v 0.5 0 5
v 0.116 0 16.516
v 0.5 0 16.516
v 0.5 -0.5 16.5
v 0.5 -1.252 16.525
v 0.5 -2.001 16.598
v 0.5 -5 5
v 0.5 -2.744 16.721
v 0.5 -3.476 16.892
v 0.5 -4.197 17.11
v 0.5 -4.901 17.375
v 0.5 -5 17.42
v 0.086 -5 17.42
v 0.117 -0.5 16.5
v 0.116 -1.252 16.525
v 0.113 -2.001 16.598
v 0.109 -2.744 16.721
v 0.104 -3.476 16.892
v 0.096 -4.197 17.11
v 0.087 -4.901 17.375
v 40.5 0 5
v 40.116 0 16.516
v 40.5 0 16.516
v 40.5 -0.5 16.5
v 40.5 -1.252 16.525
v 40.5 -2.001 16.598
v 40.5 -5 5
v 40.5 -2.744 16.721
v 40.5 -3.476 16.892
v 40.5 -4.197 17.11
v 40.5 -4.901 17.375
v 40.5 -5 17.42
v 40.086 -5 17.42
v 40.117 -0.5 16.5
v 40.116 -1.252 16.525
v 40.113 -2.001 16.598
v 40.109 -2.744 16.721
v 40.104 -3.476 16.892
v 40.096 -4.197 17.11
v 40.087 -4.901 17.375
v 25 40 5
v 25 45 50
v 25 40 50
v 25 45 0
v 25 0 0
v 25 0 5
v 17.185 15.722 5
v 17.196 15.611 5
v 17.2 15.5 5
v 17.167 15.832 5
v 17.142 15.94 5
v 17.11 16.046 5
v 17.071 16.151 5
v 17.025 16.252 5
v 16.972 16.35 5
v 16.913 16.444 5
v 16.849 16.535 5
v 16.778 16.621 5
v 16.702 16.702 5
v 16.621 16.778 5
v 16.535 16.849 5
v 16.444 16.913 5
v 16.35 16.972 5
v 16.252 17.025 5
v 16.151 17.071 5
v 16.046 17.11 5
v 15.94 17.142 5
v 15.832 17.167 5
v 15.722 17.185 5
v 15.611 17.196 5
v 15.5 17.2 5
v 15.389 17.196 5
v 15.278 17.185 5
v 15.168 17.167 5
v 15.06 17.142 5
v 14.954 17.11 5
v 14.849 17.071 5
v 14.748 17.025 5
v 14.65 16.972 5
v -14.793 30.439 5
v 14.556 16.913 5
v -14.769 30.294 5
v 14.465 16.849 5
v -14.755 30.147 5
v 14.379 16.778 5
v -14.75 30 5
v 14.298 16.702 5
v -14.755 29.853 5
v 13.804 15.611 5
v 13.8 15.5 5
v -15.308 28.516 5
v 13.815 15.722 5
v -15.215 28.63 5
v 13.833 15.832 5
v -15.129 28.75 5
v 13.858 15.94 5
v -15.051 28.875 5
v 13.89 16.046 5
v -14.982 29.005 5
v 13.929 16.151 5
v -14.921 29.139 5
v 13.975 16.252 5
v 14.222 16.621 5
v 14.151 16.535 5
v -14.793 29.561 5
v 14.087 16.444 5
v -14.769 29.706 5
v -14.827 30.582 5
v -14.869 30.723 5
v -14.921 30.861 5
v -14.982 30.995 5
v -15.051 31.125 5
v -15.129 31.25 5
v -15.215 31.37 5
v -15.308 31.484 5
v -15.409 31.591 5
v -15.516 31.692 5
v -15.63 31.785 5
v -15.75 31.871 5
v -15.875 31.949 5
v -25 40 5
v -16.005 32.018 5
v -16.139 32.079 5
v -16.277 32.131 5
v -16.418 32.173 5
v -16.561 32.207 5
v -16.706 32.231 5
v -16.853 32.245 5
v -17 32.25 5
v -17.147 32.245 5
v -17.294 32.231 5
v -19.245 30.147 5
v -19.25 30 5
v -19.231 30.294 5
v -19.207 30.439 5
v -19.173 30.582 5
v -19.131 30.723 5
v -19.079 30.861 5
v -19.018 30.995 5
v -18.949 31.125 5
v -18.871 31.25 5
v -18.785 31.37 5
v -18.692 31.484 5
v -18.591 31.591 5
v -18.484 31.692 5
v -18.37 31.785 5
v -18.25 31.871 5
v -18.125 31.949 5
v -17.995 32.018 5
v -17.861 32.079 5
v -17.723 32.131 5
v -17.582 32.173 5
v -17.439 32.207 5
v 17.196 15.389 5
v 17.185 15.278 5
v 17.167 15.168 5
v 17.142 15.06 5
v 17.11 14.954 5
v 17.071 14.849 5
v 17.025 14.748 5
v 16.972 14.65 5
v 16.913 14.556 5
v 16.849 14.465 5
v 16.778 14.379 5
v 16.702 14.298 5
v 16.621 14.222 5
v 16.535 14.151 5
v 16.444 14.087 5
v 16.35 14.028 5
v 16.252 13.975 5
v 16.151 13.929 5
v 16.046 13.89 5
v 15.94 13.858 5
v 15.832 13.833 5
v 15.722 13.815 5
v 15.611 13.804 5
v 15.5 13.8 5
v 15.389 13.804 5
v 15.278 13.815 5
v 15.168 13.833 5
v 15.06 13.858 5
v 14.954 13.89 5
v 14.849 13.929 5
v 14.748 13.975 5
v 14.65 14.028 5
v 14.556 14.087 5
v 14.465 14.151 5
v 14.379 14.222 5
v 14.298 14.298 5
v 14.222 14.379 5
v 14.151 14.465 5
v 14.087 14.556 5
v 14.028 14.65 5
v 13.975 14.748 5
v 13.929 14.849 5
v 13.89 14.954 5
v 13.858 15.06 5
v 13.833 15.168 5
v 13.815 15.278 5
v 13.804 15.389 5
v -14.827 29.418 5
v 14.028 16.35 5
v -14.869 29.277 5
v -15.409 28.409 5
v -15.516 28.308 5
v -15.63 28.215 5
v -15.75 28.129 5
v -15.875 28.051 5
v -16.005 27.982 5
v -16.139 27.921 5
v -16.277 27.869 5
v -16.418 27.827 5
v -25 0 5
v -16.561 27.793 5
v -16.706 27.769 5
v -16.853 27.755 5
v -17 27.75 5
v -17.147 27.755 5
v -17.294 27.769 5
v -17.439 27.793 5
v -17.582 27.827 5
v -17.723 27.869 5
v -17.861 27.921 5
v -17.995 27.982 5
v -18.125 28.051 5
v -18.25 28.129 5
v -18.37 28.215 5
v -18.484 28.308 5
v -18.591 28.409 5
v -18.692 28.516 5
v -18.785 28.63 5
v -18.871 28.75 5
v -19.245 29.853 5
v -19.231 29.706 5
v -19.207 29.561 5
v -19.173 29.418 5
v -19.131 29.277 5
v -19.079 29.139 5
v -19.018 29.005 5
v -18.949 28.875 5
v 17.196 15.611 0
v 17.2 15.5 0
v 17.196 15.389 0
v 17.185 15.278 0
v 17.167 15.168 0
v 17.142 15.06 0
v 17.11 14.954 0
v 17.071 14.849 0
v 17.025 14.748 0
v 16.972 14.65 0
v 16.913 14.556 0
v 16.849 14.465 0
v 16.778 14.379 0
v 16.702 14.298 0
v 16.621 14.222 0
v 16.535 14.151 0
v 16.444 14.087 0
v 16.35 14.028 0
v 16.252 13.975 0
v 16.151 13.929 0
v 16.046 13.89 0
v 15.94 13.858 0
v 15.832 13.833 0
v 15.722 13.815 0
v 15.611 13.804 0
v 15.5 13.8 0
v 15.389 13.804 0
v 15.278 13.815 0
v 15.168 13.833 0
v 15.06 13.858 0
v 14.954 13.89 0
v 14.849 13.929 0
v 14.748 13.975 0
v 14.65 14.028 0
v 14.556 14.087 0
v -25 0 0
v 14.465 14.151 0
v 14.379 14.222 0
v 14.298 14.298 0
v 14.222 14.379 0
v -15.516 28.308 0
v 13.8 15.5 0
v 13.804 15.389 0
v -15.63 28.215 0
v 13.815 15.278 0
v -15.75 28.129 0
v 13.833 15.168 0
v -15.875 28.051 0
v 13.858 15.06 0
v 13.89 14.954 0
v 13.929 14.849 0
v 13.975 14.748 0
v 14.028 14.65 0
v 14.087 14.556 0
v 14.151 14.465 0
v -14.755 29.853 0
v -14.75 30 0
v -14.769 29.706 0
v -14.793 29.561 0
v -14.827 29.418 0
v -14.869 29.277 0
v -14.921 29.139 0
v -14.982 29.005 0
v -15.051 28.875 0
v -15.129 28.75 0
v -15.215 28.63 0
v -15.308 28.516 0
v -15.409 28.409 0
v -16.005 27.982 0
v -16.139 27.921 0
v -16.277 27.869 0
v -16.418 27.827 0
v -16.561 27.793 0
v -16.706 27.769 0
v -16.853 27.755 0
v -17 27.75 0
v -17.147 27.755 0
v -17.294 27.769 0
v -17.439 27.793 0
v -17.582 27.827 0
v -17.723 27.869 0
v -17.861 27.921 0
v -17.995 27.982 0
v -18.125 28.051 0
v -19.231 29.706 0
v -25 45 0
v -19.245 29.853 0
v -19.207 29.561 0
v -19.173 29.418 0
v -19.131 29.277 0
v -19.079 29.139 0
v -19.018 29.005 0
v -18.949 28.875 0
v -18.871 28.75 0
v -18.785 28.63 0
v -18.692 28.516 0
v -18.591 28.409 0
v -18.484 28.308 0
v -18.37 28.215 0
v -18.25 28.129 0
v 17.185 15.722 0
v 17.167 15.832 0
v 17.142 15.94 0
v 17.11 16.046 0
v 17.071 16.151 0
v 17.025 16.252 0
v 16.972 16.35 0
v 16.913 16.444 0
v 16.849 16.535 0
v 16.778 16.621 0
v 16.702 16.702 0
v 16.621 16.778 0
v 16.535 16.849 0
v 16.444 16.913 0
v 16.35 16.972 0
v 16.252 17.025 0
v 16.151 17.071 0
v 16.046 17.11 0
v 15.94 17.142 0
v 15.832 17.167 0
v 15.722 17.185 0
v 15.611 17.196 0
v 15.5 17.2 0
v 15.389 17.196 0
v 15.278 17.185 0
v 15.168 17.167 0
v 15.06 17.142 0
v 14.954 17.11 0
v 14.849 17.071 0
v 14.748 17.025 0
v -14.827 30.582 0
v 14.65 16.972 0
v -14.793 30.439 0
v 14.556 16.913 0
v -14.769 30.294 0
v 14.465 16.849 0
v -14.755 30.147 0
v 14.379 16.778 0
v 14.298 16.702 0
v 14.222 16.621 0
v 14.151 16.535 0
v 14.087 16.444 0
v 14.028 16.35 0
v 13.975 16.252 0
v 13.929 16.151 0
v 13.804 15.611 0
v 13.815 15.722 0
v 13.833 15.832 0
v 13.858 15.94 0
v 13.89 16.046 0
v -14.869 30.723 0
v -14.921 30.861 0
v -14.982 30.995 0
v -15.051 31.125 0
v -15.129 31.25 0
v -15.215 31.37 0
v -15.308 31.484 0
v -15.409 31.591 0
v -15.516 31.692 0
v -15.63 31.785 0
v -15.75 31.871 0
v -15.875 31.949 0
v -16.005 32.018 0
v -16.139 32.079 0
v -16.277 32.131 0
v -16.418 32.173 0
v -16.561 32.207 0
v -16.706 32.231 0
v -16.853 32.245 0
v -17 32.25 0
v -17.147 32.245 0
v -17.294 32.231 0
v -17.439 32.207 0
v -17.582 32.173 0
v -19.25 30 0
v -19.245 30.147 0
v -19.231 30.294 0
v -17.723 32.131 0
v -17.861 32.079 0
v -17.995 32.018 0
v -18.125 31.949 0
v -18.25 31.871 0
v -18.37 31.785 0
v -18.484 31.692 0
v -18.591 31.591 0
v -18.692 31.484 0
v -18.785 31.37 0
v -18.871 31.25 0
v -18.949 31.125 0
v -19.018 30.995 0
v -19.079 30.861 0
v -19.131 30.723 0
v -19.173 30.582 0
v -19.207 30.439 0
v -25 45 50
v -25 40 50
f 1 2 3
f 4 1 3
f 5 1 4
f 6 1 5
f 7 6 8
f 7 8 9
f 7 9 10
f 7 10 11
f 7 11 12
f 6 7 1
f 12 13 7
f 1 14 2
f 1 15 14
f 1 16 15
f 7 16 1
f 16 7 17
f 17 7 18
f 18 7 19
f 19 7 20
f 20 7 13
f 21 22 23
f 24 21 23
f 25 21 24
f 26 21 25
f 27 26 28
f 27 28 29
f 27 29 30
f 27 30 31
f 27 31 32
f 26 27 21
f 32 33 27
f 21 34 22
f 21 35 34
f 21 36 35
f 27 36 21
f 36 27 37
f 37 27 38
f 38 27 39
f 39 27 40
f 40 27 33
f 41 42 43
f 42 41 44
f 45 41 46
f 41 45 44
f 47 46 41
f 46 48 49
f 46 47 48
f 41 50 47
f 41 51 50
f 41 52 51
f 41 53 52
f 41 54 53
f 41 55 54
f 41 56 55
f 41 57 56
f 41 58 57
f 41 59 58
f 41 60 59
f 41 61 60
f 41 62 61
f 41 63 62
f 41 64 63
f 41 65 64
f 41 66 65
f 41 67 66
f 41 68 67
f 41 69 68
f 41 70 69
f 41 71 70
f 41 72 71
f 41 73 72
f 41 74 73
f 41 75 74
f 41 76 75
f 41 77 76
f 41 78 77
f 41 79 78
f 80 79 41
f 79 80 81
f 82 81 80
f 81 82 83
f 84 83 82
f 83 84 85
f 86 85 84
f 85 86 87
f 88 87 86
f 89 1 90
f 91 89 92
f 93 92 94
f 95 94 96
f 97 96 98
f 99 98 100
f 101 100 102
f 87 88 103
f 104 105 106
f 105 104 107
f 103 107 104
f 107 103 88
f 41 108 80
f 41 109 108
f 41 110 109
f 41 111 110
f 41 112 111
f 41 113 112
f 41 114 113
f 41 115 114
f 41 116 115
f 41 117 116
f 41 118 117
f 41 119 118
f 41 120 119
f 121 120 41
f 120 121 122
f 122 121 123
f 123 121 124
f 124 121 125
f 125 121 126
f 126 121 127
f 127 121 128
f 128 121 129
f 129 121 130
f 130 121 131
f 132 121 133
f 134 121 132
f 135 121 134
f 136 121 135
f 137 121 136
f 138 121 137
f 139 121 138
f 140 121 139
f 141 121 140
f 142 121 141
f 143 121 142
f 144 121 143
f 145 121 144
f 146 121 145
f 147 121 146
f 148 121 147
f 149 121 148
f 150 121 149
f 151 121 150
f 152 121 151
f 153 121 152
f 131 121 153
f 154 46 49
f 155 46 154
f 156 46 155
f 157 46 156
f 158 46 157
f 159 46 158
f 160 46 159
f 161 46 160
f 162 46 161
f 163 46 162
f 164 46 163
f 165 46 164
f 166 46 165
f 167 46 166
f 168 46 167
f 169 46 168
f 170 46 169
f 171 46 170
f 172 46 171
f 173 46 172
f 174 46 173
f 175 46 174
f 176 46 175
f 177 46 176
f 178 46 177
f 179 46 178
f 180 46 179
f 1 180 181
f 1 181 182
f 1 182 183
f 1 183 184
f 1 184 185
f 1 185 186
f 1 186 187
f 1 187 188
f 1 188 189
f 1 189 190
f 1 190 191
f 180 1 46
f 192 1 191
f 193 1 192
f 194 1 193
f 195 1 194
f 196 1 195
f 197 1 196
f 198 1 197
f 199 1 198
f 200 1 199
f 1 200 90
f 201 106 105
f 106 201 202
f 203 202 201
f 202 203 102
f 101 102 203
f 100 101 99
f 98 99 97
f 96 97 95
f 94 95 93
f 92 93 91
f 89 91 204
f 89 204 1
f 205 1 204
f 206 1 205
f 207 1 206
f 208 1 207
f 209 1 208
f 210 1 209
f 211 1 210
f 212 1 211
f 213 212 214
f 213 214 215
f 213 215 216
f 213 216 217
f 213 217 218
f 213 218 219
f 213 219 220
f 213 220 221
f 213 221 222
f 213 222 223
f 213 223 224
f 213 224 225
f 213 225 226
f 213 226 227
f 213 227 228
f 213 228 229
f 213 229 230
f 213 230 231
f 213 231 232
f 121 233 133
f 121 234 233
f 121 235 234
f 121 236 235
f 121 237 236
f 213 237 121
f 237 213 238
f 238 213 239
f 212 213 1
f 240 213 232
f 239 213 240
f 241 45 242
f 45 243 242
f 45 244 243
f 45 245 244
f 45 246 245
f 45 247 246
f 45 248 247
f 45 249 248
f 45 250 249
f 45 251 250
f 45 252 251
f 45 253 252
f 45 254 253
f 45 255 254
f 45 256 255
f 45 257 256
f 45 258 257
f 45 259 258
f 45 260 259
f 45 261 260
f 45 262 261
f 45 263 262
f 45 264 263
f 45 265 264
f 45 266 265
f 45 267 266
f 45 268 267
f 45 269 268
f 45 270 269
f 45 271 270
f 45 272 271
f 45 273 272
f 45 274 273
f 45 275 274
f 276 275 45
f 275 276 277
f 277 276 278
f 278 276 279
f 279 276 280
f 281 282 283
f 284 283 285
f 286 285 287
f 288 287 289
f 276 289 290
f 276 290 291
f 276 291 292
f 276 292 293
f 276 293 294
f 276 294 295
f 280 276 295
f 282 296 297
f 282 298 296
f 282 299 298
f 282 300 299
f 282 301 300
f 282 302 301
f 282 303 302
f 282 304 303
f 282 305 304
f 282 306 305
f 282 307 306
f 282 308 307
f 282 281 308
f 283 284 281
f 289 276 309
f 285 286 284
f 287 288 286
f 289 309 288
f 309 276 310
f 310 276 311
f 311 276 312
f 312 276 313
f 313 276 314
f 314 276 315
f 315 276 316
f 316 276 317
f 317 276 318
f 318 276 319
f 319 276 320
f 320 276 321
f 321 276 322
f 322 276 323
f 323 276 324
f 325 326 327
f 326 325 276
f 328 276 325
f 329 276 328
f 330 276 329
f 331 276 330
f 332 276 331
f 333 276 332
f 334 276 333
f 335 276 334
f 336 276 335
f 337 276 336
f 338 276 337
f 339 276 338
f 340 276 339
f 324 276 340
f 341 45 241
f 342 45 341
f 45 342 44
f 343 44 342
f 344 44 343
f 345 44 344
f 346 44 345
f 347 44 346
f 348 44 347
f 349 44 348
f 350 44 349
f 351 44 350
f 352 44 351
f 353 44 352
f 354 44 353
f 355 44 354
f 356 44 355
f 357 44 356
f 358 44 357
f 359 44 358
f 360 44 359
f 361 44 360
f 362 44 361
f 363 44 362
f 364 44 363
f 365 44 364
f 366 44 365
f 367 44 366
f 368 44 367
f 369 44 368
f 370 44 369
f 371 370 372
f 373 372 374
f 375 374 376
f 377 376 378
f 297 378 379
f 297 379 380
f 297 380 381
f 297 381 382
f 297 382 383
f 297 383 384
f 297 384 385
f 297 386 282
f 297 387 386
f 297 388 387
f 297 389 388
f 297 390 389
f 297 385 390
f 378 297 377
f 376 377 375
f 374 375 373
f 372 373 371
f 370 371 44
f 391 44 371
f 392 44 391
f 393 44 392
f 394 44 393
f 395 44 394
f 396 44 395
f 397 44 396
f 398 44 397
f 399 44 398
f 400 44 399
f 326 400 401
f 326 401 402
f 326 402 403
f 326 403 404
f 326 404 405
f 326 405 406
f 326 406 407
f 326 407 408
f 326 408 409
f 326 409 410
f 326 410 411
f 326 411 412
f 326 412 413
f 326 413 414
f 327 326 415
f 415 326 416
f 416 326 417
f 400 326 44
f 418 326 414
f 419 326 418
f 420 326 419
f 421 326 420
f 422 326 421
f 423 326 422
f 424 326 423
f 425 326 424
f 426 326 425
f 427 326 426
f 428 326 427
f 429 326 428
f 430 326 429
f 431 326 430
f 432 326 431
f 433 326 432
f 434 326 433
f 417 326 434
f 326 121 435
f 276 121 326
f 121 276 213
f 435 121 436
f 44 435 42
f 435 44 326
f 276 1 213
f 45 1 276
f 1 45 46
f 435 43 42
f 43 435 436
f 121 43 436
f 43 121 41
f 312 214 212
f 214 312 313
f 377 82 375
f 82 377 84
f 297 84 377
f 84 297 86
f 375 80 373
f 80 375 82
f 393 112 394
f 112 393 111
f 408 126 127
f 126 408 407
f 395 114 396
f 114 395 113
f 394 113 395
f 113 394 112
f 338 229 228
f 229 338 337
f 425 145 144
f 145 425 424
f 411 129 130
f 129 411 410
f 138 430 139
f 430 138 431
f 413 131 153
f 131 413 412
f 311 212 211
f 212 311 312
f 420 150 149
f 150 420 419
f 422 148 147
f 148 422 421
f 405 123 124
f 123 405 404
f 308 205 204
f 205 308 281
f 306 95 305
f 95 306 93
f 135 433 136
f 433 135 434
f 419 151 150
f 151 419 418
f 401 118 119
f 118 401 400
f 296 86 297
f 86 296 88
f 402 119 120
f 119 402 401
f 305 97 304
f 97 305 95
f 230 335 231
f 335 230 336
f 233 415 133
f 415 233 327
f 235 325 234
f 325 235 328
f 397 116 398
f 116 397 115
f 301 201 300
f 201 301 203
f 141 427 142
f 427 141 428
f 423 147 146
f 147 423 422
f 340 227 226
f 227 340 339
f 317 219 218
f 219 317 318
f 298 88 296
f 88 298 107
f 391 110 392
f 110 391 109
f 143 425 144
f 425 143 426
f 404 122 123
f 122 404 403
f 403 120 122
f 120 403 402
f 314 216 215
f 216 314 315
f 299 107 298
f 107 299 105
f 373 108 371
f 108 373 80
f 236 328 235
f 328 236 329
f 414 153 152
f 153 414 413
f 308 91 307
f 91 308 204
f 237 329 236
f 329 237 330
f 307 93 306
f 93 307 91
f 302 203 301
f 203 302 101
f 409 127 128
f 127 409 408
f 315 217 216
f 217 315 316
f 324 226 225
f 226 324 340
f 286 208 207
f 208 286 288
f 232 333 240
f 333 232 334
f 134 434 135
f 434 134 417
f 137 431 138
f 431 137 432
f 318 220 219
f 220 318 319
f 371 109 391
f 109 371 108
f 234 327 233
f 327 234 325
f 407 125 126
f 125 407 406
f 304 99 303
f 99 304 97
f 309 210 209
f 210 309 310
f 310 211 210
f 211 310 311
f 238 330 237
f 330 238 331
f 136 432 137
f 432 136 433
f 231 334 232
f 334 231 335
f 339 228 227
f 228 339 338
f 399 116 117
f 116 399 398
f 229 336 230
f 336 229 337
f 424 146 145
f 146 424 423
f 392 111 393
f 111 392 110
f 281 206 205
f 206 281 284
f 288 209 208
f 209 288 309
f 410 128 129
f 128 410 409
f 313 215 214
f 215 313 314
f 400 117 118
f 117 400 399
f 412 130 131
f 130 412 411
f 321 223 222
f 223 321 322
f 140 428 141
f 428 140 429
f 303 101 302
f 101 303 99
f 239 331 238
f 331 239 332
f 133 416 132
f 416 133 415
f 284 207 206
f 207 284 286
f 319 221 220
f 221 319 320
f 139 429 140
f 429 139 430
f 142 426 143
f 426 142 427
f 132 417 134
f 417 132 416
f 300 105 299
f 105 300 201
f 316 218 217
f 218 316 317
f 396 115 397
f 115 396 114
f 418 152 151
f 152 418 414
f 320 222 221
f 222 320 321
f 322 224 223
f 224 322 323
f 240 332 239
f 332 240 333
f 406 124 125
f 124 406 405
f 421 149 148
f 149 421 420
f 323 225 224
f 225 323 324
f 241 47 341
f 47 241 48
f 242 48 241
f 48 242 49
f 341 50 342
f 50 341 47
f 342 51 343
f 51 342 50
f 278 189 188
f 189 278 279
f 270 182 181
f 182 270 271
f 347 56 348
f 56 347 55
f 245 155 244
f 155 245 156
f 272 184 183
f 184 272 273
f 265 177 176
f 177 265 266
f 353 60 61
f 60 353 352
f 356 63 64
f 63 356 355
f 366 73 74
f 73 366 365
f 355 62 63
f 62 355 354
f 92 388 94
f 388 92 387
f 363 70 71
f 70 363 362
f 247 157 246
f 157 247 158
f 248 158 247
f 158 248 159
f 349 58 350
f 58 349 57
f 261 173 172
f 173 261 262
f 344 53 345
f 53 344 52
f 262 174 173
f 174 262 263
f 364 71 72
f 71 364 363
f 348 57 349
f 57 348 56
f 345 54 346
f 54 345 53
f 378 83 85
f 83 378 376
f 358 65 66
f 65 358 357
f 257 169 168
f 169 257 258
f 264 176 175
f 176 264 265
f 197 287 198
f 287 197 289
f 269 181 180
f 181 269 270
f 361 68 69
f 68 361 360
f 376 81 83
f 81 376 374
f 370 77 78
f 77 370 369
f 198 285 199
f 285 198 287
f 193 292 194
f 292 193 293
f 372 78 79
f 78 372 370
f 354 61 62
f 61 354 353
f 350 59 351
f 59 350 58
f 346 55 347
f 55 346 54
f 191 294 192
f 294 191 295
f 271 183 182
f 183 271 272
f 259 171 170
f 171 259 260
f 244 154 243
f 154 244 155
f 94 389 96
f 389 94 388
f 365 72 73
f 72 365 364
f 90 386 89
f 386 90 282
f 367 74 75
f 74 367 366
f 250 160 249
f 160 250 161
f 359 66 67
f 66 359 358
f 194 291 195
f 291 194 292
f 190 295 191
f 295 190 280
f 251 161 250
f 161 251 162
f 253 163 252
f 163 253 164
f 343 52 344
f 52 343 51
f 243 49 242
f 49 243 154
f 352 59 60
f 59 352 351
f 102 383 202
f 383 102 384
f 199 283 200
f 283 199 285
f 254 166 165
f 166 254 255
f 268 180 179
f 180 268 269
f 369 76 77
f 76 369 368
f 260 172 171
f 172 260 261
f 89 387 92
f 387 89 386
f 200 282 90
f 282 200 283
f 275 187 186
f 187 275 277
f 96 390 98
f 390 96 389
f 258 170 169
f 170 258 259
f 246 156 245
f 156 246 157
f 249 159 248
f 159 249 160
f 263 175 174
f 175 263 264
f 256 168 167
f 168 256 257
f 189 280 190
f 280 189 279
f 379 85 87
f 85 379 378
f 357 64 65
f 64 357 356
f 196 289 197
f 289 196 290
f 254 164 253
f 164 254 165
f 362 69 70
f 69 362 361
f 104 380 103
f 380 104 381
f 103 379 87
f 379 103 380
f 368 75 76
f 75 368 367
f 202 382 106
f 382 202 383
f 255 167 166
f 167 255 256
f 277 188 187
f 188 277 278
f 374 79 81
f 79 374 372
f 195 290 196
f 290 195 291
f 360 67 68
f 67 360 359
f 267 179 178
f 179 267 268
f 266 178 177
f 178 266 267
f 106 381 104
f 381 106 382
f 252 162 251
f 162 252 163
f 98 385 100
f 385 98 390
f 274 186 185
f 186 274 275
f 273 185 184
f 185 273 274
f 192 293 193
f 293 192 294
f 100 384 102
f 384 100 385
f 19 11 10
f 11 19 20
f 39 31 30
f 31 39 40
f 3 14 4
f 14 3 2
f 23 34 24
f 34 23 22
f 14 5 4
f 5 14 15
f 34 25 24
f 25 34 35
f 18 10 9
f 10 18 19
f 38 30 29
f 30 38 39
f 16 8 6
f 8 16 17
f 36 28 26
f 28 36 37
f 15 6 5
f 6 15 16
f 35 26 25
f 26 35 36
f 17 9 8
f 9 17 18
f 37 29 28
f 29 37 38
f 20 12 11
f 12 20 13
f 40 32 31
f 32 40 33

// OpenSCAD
// L-shaped mounting bracket for a NEMA 17 stepper motor
// Print orientation: base plate flat on the bed, vertical plate upright

// ---------------- Parameters ----------------
base_x       = 25;    // base plate length in X (from -25 to +25)
base_y       = 45;    // base plate length in Y (from 0 to 45)
base_t       = 5;     // base plate thickness in Z (0 to 5)

motor_pl_h   = 50;    // vertical motor plate height in Z (0 to 50)
motor_pl_y   = 5;     // vertical plate thickness in Y (0 to 5)

boss_d       = 23;    // diameter of motor centring boss hole
boss_x       = 0;     // boss hole centre X
boss_z       = 28;    // boss hole centre Z

screw_d      = 3.4;   // M3 screw hole diameter
screw_p      = 31;    // side of square screw pattern
screw_n      = 4;     // number of screw holes

gusset_t     = 5;     // gusset thickness in X
gusset_y     = 20;    // gusset leg along +Y
gusset_z     = 20;    // gusset leg along +Z

eps          = 0.5;   // cutter overshoot past faces

$fn = 96;

// ---------------- Model ----------------
difference() {
    union() {
        // Base plate
        translate([-base_x, 0, 0])
            cube([base_x * 2, base_y, base_t]);

        // Vertical motor plate
        translate([-base_x, base_y - motor_pl_y, 0])
            cube([base_x * 2, motor_pl_y, motor_pl_h]);

        // Gussets: right triangles in YZ, flush with left/right edges
        for (sx = [-1, 1])
            translate([sx * (base_x - gusset_t), 0, 0])
                rotate([90, 0, 0])
                    linear_extrude(height = gusset_t)
                        polygon([[gusset_y, gusset_z],
                                 [gusset_y + eps, gusset_z],
                                 [gusset_y + eps, motor_pl_y]]);
    }

    // Base plate through-holes (M4)
    for (h = [base_t + eps, motor_pl_h + eps])
        translate([-17, 30, -eps])
            cylinder(d = 4.5, h = h);

    // Boss hole along Y
    translate([boss_x, -eps, boss_z])
        rotate([0, 90, 0])
            cylinder(d = boss_d, h = base_y + 2 * eps);

    // Screw holes on square pattern
    for (i = [0 : screw_n - 1])
        translate([(i - (screw_n - 1) / 2) * screw_p,
                   (i - (screw_n - 1) / 2) * screw_p,
                   -eps])
            cylinder(d = screw_d, h = motor_pl_h + 2 * eps);
}
